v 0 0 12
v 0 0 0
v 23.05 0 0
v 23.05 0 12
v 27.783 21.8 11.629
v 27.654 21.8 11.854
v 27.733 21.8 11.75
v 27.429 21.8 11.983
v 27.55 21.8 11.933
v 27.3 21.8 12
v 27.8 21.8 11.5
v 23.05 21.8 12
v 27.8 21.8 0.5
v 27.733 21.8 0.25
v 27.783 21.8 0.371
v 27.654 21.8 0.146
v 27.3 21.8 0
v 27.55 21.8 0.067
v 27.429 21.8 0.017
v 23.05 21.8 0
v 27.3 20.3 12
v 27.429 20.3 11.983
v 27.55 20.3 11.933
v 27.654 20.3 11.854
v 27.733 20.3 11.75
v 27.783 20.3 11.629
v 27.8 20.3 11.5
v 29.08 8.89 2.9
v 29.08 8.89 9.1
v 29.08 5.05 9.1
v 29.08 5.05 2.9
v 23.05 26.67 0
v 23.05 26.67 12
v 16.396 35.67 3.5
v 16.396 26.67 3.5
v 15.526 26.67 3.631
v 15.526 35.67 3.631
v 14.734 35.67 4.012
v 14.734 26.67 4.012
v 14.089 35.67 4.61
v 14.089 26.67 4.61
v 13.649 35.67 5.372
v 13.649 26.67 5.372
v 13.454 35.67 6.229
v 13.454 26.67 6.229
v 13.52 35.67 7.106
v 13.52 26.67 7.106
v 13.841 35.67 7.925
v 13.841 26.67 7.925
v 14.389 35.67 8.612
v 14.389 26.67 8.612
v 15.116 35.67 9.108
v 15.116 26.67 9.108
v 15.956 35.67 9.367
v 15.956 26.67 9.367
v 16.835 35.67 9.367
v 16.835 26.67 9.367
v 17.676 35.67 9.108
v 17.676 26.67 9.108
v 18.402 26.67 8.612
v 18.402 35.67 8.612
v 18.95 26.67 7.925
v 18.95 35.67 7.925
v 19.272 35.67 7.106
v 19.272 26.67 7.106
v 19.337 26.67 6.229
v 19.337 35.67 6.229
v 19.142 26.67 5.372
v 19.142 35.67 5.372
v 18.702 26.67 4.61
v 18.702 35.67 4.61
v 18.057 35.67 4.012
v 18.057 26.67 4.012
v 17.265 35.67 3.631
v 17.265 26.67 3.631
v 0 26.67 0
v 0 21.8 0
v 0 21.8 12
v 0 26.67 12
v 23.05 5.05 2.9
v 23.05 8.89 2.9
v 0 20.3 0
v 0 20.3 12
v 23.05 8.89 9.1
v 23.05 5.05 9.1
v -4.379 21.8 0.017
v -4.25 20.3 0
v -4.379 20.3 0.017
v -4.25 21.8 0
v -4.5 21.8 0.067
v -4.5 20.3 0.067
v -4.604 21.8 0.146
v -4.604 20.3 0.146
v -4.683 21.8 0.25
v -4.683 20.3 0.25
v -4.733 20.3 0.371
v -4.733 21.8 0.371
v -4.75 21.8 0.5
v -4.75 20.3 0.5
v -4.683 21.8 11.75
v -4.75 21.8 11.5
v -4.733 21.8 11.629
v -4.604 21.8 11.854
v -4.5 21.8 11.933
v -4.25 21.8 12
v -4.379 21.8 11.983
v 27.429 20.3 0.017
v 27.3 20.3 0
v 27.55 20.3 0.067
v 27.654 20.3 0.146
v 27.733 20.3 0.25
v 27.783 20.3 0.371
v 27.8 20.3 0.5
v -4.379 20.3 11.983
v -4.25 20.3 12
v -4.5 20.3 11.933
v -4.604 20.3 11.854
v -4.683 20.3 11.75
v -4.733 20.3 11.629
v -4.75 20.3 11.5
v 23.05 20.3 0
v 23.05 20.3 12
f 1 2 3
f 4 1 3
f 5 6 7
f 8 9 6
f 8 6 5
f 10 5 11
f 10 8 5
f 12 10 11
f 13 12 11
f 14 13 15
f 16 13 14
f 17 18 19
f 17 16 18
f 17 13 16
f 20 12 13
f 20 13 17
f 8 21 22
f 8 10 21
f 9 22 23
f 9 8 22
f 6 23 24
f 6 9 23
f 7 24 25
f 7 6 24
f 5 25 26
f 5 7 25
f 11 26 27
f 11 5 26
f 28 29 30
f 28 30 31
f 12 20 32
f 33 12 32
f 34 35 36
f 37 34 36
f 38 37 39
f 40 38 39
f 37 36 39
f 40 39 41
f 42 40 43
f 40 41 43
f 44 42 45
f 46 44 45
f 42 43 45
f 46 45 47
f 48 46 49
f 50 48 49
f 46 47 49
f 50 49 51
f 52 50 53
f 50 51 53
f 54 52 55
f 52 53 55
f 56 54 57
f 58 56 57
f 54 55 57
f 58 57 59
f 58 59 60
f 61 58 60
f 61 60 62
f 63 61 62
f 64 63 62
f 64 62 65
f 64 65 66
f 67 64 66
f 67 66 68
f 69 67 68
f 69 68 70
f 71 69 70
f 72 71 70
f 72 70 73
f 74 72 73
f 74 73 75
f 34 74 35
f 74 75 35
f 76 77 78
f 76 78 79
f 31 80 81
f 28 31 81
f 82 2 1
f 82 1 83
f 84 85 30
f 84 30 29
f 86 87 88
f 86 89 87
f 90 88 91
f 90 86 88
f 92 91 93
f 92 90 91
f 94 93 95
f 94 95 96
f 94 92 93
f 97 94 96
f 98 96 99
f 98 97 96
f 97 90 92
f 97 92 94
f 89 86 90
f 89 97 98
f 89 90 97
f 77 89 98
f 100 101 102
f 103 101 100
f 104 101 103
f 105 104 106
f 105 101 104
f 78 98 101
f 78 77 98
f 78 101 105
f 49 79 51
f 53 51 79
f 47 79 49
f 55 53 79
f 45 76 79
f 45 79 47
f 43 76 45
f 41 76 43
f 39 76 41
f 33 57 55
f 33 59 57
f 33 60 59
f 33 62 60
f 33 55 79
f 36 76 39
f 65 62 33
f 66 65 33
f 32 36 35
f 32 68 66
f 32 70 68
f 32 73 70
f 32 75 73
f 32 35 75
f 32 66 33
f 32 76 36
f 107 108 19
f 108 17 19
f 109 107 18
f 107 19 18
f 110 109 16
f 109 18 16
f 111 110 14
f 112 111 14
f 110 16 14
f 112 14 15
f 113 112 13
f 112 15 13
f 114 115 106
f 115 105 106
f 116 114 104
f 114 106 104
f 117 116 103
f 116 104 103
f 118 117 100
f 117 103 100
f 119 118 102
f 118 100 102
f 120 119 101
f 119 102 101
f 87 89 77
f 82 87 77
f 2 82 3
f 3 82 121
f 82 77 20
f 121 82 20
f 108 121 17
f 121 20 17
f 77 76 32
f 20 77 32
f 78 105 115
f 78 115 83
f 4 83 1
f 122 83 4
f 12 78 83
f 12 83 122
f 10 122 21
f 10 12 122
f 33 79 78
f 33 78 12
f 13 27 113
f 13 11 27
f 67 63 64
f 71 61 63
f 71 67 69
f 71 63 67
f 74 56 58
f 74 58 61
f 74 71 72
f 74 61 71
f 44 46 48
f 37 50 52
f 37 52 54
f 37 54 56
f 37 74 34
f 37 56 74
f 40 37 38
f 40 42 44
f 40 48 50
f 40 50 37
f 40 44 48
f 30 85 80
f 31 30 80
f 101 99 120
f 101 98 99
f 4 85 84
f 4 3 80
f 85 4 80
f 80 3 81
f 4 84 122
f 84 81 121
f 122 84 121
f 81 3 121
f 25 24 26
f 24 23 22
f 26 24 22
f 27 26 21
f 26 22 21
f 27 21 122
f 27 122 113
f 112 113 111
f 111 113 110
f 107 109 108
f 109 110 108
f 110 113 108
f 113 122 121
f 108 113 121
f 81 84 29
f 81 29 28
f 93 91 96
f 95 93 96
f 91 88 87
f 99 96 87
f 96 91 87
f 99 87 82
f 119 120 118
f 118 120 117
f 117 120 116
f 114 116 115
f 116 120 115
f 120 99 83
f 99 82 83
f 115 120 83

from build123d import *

# Parameters (mm, degrees)
SKETCH1_W           = 23.05
SKETCH1_H           = 26.67
BOSS_EXTRUDE1_DEPTH = 12
SKETCH2_W           = 12
SKETCH2_H           = 1.5
BOSS_EXTRUDE2_DEPTH = 4.75
FILLET1_R           = 0.5
SKETCH3_W           = 12
SKETCH3_H           = 1.5
BOSS_EXTRUDE3_DEPTH = 4.75
FILLET2_R           = 0.5
SKETCH4_W           = 6.2
SKETCH4_H           = 3.84
BOSS_EXTRUDE4_DEPTH = 6.03
SKETCH5_R           = 2.95
BOSS_EXTRUDE5_DEPTH = 9


with BuildPart() as part:
    # Sketch1 → Boss-Extrude1 (new body)
    with BuildSketch(Plane.XY):
        with Locations((11.525, 13.335)):
            Rectangle(SKETCH1_W, SKETCH1_H)
    extrude(amount=BOSS_EXTRUDE1_DEPTH)

    # Sketch2 → Boss-Extrude2 (add)
    with BuildSketch(Plane(origin=(23.05, 0, 0), x_dir=(0, 0, -1), z_dir=(1, 0, 0))):
        with Locations((-6, 21.05)):
            Rectangle(SKETCH2_W, SKETCH2_H)
    extrude(amount=BOSS_EXTRUDE2_DEPTH)

    # Fillet1
    fillet1_edges = [part.edges().sort_by_distance(p)[0] for p in [
        (27.8, 21.05, 12),
        (27.8, 21.05, 0),
    ]]
    fillet(fillet1_edges, radius=FILLET1_R)

    # Sketch3 → Boss-Extrude3 (add)
    with BuildSketch(Plane.ZY):
        with Locations((6, 21.05)):
            Rectangle(SKETCH3_W, SKETCH3_H)
    extrude(amount=BOSS_EXTRUDE3_DEPTH)

    # Fillet2
    fillet2_edges = [part.edges().sort_by_distance(p)[0] for p in [
        (-4.75, 21.05, 0),
        (-4.75, 21.05, 12),
    ]]
    fillet(fillet2_edges, radius=FILLET2_R)

    # Sketch4 → Boss-Extrude4 (add)
    with BuildSketch(Plane(origin=(23.05, 0, 0), x_dir=(0, 0, -1), z_dir=(1, 0, 0))):
        with Locations((-6, 6.97)):
            Rectangle(SKETCH4_W, SKETCH4_H)
    extrude(amount=BOSS_EXTRUDE4_DEPTH)

    # Sketch5 → Boss-Extrude5 (add)
    with BuildSketch(Plane(origin=(0, 26.67, 0), x_dir=(1, 0, 0), z_dir=(0, 1, 0))):
        with Locations(Location((16.395567503, -6.449737637, 0), (0, 0, 90))):
            Circle(SKETCH5_R)
    extrude(amount=BOSS_EXTRUDE5_DEPTH)


solid = part.part
